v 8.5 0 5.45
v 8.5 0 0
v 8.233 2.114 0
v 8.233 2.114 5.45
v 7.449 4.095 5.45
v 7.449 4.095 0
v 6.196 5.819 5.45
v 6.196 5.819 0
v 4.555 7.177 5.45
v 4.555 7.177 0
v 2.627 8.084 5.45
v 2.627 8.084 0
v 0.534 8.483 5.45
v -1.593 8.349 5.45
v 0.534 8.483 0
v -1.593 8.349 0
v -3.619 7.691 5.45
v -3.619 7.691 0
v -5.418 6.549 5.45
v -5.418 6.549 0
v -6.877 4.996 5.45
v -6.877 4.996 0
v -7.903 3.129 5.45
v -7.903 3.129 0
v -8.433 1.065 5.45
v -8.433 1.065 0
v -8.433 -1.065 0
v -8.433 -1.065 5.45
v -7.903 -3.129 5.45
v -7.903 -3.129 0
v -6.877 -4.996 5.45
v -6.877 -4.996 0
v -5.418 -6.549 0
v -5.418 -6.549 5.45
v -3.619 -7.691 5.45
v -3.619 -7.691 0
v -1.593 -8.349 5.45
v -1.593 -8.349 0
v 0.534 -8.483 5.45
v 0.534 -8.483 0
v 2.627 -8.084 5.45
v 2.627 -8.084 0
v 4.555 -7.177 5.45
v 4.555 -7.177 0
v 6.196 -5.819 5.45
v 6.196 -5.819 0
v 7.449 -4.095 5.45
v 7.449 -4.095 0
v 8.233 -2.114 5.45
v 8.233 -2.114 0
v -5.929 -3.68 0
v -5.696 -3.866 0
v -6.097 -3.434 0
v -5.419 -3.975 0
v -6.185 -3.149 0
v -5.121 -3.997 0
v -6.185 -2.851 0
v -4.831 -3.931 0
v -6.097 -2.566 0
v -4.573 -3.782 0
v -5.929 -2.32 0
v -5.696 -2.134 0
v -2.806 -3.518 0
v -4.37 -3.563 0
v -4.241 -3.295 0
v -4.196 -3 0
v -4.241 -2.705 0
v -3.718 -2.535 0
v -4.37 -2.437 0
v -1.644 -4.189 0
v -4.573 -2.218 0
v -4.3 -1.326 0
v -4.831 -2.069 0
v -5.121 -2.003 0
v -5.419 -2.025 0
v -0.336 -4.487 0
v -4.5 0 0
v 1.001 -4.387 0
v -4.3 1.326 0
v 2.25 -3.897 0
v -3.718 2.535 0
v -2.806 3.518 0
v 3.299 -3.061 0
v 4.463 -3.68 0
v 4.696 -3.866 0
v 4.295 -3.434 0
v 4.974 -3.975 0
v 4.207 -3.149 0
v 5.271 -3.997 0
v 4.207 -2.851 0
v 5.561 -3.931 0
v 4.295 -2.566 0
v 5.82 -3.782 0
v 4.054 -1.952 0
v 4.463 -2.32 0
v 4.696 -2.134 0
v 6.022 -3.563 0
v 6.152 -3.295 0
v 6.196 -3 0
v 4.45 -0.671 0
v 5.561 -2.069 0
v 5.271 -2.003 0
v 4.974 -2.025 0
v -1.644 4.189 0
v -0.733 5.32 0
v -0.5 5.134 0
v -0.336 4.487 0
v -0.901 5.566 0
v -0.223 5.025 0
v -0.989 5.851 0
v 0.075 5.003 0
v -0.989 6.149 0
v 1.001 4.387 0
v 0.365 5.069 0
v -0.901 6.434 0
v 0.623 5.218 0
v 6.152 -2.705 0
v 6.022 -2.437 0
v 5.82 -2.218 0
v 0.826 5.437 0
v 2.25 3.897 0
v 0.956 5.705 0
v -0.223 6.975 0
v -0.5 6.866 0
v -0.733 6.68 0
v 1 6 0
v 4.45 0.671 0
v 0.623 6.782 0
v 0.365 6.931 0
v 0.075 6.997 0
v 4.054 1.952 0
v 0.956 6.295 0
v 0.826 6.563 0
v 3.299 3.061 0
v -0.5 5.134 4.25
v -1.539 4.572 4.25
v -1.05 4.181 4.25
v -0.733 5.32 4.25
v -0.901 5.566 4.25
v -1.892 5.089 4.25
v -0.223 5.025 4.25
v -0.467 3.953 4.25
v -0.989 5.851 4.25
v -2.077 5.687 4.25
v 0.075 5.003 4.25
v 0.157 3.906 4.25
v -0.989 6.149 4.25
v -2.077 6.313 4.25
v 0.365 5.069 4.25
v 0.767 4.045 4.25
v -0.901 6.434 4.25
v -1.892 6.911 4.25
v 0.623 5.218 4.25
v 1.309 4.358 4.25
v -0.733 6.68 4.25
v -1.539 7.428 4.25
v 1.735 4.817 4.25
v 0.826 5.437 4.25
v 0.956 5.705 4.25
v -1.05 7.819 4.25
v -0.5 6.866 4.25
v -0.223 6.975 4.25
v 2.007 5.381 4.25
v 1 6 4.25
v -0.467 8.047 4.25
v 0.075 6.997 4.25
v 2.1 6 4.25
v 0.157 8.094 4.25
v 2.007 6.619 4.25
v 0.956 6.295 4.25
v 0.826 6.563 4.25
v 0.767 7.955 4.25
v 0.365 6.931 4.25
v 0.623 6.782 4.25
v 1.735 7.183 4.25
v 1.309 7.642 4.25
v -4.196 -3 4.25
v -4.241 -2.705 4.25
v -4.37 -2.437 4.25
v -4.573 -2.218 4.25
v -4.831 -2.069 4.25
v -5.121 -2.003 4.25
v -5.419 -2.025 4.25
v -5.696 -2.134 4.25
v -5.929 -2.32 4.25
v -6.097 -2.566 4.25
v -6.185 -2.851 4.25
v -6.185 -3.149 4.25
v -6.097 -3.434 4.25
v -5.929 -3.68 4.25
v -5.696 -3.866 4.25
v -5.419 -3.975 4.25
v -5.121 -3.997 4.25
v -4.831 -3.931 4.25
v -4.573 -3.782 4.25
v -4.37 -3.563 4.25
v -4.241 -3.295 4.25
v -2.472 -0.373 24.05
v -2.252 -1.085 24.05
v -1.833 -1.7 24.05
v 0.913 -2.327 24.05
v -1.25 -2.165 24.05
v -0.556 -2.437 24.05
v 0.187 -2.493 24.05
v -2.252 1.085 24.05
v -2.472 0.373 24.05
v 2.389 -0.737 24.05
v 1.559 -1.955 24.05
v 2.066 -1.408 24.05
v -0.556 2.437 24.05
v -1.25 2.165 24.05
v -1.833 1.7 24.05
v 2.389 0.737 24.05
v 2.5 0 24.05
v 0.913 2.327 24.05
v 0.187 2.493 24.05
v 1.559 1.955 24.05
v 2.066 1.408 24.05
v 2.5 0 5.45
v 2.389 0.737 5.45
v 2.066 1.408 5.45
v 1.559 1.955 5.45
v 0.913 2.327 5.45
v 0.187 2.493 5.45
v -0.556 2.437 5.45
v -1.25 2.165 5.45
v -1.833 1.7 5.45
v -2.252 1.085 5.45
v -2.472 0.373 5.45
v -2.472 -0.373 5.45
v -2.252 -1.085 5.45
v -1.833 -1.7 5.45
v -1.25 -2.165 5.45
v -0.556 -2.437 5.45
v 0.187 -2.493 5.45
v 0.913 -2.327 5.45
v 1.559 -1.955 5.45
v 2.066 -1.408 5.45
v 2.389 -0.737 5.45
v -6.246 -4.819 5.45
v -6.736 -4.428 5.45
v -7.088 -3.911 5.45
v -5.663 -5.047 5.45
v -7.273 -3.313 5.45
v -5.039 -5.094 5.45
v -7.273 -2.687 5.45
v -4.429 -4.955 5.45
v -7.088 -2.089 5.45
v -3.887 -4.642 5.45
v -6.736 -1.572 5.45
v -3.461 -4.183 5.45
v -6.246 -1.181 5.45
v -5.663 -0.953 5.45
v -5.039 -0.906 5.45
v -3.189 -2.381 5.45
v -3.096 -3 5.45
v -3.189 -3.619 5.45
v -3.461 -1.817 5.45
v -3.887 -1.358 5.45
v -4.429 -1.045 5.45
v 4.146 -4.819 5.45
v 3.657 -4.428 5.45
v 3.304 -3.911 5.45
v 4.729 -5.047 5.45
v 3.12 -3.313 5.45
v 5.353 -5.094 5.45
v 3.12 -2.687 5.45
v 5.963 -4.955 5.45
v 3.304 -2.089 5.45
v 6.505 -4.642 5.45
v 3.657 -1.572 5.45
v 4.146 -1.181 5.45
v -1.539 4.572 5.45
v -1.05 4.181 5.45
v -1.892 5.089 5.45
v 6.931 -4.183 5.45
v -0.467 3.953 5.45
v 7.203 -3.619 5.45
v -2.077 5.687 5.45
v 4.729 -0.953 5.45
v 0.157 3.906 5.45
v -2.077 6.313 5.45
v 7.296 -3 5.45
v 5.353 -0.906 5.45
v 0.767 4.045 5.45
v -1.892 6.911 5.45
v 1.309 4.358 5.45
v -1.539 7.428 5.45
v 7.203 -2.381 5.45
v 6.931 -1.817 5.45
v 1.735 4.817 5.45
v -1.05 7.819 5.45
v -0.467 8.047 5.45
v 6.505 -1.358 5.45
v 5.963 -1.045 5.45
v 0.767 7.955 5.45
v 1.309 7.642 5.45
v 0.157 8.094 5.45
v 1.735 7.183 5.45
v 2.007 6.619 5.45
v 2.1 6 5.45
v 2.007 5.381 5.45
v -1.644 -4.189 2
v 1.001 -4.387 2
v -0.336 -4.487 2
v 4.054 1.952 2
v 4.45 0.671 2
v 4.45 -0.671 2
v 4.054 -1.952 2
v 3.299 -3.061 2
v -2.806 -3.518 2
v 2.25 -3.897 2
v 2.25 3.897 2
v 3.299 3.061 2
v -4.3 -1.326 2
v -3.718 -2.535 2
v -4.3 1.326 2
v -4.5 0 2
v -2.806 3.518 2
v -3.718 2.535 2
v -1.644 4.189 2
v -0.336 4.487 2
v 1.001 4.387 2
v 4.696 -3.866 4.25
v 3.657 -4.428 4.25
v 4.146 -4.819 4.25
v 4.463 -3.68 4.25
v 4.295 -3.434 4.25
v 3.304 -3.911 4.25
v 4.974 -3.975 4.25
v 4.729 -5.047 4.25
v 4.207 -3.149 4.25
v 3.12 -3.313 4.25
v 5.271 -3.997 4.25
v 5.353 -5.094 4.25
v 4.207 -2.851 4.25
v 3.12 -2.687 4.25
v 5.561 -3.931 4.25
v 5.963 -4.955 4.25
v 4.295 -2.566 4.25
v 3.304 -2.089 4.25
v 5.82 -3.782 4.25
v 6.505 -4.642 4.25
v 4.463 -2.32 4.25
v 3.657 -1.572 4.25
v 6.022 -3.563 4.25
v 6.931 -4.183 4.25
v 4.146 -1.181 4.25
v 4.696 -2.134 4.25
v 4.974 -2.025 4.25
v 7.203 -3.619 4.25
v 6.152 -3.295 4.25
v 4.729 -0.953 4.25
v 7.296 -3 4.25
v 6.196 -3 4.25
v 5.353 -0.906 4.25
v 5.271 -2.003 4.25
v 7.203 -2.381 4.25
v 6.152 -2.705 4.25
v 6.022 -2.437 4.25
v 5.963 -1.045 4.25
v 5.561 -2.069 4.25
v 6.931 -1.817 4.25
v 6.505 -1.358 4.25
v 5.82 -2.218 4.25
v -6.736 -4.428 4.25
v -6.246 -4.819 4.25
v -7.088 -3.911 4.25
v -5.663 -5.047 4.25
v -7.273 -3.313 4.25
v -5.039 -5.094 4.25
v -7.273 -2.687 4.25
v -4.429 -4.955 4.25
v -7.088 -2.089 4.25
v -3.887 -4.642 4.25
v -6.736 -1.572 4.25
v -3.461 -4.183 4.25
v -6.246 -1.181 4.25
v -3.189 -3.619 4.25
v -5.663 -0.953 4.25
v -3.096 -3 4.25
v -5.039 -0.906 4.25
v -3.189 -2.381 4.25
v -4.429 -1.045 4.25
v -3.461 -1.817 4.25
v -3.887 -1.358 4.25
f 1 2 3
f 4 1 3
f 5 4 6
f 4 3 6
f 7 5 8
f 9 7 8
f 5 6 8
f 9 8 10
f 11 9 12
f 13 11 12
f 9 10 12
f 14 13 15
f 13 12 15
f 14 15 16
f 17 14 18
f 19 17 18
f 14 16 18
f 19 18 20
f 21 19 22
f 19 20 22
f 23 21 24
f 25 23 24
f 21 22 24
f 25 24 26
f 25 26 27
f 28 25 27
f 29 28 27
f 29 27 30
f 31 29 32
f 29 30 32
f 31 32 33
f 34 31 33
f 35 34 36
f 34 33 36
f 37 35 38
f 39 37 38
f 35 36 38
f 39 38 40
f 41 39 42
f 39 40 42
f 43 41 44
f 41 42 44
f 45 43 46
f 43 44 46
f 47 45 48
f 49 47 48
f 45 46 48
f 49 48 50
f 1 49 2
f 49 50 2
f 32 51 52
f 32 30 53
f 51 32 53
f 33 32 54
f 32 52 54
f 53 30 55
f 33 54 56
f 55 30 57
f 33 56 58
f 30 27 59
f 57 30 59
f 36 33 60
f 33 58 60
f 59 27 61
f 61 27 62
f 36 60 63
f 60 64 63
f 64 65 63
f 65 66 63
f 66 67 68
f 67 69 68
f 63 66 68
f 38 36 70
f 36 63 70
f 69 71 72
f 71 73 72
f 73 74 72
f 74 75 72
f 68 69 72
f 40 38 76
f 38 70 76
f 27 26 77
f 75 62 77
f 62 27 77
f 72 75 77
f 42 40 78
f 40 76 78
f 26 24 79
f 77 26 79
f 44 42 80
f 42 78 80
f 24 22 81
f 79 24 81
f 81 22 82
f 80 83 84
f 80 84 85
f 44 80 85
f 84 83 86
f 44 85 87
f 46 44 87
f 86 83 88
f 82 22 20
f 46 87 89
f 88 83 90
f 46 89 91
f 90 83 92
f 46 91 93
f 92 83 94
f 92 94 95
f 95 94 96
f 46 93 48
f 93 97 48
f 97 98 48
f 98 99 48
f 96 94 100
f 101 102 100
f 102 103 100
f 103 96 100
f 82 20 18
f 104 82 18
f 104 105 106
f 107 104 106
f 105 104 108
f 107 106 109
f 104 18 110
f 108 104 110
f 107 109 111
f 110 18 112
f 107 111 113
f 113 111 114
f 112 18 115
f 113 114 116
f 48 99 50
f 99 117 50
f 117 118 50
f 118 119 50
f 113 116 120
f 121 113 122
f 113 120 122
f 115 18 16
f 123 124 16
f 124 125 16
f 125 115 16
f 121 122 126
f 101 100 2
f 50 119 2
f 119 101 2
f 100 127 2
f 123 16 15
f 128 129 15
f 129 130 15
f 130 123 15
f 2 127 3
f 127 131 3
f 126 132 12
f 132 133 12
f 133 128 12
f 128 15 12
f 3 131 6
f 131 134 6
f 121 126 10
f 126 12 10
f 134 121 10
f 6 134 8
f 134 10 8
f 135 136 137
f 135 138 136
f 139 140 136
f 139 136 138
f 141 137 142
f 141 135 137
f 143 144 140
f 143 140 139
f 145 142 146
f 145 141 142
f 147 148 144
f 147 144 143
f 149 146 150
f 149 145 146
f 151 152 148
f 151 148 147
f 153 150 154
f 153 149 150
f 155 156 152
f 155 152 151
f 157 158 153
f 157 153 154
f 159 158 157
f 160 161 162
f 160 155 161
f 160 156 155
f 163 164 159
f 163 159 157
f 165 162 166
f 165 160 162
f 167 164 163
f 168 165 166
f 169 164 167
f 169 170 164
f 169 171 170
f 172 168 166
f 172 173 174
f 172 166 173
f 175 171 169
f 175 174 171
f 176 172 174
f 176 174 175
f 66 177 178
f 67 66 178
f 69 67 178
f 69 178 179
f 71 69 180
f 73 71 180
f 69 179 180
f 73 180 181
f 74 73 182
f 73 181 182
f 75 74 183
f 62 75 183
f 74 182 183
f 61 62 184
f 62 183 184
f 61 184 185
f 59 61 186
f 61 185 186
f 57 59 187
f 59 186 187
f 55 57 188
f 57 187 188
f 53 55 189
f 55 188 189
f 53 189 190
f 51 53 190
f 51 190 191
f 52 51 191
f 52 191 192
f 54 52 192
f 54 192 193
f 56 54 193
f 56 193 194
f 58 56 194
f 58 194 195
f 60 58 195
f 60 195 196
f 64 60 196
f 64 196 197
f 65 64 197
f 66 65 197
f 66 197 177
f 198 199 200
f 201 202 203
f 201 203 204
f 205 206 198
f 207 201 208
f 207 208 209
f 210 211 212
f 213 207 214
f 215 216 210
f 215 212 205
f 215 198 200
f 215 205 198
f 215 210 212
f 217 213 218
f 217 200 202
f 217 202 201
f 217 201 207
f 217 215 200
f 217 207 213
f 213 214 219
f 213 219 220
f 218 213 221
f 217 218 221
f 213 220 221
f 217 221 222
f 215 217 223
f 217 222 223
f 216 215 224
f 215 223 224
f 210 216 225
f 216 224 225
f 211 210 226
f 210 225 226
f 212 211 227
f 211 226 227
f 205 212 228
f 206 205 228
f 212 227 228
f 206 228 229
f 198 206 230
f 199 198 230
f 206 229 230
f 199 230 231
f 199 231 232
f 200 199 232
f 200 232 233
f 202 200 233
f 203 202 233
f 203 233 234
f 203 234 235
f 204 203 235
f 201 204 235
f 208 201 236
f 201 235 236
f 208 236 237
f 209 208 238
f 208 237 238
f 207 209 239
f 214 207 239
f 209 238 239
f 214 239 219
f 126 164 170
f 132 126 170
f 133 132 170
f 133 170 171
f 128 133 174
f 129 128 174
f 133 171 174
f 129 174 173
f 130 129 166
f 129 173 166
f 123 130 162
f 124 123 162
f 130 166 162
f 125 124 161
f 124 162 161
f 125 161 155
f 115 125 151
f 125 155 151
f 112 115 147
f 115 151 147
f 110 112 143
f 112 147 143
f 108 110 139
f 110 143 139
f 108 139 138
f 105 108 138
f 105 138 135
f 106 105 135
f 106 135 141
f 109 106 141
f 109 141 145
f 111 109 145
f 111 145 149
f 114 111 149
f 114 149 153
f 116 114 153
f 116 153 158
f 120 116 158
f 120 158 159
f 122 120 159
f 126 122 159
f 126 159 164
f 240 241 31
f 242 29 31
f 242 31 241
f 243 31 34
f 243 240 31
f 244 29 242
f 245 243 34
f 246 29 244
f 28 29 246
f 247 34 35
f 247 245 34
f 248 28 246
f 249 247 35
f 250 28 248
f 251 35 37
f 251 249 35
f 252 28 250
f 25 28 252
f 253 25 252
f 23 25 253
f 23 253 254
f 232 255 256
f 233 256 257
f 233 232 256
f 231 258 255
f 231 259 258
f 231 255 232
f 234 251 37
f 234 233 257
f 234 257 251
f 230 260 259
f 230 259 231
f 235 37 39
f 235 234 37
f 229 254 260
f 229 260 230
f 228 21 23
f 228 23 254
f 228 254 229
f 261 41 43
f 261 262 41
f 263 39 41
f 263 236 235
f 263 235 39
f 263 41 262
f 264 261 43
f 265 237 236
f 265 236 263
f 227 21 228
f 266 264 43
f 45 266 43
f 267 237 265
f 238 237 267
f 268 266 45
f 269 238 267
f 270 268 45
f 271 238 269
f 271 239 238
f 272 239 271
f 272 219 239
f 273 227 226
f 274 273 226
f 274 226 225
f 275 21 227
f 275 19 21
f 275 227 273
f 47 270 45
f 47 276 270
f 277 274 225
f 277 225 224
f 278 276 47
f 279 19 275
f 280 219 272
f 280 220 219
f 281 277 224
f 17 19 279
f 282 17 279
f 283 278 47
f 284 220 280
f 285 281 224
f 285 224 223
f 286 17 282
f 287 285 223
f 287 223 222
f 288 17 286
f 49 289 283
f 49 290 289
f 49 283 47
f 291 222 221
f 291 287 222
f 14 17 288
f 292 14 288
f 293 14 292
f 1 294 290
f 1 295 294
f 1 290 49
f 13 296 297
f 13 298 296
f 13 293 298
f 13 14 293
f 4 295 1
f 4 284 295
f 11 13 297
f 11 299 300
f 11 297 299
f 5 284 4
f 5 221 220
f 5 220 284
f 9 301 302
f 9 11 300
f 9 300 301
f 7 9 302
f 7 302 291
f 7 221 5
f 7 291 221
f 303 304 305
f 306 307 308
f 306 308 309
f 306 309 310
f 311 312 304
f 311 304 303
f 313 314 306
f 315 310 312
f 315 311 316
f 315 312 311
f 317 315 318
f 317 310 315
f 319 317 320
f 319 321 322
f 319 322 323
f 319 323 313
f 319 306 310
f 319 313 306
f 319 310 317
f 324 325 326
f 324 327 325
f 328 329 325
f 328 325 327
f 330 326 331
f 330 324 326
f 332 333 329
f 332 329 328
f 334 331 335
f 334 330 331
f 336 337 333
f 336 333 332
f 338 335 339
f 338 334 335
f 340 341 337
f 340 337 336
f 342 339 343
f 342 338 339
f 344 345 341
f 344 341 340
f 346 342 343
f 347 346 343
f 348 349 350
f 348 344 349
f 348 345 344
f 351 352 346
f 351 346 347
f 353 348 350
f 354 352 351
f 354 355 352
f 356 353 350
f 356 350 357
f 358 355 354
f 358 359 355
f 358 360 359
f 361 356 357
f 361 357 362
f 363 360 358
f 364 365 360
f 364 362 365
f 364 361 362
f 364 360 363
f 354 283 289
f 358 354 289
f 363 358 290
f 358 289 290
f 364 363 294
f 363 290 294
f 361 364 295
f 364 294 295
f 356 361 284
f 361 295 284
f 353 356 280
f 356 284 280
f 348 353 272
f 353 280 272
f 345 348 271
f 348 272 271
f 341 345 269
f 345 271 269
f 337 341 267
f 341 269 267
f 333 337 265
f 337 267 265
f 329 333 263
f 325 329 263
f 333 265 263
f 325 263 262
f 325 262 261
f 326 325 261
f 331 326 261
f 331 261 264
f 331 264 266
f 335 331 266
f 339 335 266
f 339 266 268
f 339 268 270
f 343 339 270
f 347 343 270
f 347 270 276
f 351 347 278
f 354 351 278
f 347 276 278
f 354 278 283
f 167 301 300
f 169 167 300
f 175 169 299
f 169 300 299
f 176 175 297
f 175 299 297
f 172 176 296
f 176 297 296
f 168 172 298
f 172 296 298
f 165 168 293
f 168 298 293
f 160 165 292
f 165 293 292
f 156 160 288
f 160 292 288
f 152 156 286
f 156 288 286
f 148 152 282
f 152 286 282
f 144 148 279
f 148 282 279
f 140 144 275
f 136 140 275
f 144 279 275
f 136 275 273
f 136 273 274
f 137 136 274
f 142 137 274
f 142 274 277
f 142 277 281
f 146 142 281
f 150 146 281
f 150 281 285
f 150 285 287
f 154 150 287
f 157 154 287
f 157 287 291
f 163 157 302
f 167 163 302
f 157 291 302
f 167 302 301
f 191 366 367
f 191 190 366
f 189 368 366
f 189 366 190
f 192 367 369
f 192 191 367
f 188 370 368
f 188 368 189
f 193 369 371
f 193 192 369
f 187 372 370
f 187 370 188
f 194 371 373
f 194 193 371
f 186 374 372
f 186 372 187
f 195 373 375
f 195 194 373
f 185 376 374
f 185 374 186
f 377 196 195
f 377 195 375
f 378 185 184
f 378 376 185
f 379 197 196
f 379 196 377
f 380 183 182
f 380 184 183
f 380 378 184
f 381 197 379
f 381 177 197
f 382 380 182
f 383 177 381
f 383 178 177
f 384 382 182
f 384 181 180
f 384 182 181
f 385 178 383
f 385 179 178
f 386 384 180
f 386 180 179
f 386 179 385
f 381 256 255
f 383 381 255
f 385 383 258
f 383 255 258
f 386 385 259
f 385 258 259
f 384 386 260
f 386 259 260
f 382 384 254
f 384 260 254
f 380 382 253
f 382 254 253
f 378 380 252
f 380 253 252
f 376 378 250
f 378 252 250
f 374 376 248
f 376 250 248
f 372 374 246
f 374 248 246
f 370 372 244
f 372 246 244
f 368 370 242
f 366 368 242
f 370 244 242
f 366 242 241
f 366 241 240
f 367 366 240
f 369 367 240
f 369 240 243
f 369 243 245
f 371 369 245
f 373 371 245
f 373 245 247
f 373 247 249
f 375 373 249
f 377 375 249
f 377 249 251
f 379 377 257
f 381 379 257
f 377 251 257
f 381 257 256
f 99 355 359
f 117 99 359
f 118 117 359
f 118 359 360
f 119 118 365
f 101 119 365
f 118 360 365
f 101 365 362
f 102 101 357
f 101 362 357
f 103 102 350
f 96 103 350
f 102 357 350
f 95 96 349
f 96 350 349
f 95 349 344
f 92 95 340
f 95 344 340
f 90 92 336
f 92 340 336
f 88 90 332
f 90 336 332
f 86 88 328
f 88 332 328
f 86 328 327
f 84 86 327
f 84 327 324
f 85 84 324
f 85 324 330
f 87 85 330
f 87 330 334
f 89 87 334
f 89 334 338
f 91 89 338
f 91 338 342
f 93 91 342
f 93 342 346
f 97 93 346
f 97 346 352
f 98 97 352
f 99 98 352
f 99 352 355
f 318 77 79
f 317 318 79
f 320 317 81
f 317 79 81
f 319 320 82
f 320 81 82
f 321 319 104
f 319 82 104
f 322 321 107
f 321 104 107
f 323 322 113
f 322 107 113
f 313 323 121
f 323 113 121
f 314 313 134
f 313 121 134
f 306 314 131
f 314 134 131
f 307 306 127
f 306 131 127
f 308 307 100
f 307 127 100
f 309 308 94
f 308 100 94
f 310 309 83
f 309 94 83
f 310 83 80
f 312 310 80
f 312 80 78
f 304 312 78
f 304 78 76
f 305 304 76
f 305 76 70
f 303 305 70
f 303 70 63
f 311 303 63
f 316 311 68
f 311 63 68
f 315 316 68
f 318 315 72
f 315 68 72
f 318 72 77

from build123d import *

# Parameters (mm, degrees)
SKETCH1_R           = 8.5
BOSS_EXTRUDE1_DEPTH = 5.45
SKETCH2_R           = 1
CUT_EXTRUDE1_DEPTH  = 5.45
SKETCH3_R           = 2.5
BOSS_EXTRUDE2_DEPTH = 18.6
SKETCH6_R           = 2.1
CUT_EXTRUDE2_DEPTH  = 1.2
SKETCH7_R           = 4.5
CUT_EXTRUDE3_DEPTH  = 2


with BuildPart() as part:
    # Sketch1 → Boss-Extrude1 (new body)
    with BuildSketch(Plane.XY):
        Circle(SKETCH1_R)
    extrude(amount=BOSS_EXTRUDE1_DEPTH)

    # Sketch2 → Cut-Extrude1 (cut)
    with BuildSketch(Plane.XY.offset(5.45)):
        with Locations((0, 6)):
            Circle(SKETCH2_R)
        with Locations((5.196152423, -3)):
            Circle(SKETCH2_R)
        with Locations((-5.196152423, -3)):
            Circle(SKETCH2_R)
    extrude(amount=-CUT_EXTRUDE1_DEPTH, mode=Mode.SUBTRACT)

    # Sketch3 → Boss-Extrude2 (add)
    with BuildSketch(Plane.XY.offset(5.45)):
        Circle(SKETCH3_R)
    extrude(amount=BOSS_EXTRUDE2_DEPTH)

    # Sketch6 → Cut-Extrude2 (cut)
    with BuildSketch(Plane.XY.offset(5.45)):
        with Locations((5.196152423, -3)):
            Circle(SKETCH6_R)
        with Locations((0, 6)):
            Circle(SKETCH6_R)
        with Locations((-5.196152423, -3)):
            Circle(SKETCH6_R)
    extrude(amount=-CUT_EXTRUDE2_DEPTH, mode=Mode.SUBTRACT)

    # Sketch7 → Cut-Extrude3 (cut)
    with BuildSketch(Plane(origin=(0, 0, 0), x_dir=(-1, 0, 0), z_dir=(0, 0, -1))):
        Circle(SKETCH7_R)
    extrude(amount=-CUT_EXTRUDE3_DEPTH, mode=Mode.SUBTRACT)


solid = part.part
